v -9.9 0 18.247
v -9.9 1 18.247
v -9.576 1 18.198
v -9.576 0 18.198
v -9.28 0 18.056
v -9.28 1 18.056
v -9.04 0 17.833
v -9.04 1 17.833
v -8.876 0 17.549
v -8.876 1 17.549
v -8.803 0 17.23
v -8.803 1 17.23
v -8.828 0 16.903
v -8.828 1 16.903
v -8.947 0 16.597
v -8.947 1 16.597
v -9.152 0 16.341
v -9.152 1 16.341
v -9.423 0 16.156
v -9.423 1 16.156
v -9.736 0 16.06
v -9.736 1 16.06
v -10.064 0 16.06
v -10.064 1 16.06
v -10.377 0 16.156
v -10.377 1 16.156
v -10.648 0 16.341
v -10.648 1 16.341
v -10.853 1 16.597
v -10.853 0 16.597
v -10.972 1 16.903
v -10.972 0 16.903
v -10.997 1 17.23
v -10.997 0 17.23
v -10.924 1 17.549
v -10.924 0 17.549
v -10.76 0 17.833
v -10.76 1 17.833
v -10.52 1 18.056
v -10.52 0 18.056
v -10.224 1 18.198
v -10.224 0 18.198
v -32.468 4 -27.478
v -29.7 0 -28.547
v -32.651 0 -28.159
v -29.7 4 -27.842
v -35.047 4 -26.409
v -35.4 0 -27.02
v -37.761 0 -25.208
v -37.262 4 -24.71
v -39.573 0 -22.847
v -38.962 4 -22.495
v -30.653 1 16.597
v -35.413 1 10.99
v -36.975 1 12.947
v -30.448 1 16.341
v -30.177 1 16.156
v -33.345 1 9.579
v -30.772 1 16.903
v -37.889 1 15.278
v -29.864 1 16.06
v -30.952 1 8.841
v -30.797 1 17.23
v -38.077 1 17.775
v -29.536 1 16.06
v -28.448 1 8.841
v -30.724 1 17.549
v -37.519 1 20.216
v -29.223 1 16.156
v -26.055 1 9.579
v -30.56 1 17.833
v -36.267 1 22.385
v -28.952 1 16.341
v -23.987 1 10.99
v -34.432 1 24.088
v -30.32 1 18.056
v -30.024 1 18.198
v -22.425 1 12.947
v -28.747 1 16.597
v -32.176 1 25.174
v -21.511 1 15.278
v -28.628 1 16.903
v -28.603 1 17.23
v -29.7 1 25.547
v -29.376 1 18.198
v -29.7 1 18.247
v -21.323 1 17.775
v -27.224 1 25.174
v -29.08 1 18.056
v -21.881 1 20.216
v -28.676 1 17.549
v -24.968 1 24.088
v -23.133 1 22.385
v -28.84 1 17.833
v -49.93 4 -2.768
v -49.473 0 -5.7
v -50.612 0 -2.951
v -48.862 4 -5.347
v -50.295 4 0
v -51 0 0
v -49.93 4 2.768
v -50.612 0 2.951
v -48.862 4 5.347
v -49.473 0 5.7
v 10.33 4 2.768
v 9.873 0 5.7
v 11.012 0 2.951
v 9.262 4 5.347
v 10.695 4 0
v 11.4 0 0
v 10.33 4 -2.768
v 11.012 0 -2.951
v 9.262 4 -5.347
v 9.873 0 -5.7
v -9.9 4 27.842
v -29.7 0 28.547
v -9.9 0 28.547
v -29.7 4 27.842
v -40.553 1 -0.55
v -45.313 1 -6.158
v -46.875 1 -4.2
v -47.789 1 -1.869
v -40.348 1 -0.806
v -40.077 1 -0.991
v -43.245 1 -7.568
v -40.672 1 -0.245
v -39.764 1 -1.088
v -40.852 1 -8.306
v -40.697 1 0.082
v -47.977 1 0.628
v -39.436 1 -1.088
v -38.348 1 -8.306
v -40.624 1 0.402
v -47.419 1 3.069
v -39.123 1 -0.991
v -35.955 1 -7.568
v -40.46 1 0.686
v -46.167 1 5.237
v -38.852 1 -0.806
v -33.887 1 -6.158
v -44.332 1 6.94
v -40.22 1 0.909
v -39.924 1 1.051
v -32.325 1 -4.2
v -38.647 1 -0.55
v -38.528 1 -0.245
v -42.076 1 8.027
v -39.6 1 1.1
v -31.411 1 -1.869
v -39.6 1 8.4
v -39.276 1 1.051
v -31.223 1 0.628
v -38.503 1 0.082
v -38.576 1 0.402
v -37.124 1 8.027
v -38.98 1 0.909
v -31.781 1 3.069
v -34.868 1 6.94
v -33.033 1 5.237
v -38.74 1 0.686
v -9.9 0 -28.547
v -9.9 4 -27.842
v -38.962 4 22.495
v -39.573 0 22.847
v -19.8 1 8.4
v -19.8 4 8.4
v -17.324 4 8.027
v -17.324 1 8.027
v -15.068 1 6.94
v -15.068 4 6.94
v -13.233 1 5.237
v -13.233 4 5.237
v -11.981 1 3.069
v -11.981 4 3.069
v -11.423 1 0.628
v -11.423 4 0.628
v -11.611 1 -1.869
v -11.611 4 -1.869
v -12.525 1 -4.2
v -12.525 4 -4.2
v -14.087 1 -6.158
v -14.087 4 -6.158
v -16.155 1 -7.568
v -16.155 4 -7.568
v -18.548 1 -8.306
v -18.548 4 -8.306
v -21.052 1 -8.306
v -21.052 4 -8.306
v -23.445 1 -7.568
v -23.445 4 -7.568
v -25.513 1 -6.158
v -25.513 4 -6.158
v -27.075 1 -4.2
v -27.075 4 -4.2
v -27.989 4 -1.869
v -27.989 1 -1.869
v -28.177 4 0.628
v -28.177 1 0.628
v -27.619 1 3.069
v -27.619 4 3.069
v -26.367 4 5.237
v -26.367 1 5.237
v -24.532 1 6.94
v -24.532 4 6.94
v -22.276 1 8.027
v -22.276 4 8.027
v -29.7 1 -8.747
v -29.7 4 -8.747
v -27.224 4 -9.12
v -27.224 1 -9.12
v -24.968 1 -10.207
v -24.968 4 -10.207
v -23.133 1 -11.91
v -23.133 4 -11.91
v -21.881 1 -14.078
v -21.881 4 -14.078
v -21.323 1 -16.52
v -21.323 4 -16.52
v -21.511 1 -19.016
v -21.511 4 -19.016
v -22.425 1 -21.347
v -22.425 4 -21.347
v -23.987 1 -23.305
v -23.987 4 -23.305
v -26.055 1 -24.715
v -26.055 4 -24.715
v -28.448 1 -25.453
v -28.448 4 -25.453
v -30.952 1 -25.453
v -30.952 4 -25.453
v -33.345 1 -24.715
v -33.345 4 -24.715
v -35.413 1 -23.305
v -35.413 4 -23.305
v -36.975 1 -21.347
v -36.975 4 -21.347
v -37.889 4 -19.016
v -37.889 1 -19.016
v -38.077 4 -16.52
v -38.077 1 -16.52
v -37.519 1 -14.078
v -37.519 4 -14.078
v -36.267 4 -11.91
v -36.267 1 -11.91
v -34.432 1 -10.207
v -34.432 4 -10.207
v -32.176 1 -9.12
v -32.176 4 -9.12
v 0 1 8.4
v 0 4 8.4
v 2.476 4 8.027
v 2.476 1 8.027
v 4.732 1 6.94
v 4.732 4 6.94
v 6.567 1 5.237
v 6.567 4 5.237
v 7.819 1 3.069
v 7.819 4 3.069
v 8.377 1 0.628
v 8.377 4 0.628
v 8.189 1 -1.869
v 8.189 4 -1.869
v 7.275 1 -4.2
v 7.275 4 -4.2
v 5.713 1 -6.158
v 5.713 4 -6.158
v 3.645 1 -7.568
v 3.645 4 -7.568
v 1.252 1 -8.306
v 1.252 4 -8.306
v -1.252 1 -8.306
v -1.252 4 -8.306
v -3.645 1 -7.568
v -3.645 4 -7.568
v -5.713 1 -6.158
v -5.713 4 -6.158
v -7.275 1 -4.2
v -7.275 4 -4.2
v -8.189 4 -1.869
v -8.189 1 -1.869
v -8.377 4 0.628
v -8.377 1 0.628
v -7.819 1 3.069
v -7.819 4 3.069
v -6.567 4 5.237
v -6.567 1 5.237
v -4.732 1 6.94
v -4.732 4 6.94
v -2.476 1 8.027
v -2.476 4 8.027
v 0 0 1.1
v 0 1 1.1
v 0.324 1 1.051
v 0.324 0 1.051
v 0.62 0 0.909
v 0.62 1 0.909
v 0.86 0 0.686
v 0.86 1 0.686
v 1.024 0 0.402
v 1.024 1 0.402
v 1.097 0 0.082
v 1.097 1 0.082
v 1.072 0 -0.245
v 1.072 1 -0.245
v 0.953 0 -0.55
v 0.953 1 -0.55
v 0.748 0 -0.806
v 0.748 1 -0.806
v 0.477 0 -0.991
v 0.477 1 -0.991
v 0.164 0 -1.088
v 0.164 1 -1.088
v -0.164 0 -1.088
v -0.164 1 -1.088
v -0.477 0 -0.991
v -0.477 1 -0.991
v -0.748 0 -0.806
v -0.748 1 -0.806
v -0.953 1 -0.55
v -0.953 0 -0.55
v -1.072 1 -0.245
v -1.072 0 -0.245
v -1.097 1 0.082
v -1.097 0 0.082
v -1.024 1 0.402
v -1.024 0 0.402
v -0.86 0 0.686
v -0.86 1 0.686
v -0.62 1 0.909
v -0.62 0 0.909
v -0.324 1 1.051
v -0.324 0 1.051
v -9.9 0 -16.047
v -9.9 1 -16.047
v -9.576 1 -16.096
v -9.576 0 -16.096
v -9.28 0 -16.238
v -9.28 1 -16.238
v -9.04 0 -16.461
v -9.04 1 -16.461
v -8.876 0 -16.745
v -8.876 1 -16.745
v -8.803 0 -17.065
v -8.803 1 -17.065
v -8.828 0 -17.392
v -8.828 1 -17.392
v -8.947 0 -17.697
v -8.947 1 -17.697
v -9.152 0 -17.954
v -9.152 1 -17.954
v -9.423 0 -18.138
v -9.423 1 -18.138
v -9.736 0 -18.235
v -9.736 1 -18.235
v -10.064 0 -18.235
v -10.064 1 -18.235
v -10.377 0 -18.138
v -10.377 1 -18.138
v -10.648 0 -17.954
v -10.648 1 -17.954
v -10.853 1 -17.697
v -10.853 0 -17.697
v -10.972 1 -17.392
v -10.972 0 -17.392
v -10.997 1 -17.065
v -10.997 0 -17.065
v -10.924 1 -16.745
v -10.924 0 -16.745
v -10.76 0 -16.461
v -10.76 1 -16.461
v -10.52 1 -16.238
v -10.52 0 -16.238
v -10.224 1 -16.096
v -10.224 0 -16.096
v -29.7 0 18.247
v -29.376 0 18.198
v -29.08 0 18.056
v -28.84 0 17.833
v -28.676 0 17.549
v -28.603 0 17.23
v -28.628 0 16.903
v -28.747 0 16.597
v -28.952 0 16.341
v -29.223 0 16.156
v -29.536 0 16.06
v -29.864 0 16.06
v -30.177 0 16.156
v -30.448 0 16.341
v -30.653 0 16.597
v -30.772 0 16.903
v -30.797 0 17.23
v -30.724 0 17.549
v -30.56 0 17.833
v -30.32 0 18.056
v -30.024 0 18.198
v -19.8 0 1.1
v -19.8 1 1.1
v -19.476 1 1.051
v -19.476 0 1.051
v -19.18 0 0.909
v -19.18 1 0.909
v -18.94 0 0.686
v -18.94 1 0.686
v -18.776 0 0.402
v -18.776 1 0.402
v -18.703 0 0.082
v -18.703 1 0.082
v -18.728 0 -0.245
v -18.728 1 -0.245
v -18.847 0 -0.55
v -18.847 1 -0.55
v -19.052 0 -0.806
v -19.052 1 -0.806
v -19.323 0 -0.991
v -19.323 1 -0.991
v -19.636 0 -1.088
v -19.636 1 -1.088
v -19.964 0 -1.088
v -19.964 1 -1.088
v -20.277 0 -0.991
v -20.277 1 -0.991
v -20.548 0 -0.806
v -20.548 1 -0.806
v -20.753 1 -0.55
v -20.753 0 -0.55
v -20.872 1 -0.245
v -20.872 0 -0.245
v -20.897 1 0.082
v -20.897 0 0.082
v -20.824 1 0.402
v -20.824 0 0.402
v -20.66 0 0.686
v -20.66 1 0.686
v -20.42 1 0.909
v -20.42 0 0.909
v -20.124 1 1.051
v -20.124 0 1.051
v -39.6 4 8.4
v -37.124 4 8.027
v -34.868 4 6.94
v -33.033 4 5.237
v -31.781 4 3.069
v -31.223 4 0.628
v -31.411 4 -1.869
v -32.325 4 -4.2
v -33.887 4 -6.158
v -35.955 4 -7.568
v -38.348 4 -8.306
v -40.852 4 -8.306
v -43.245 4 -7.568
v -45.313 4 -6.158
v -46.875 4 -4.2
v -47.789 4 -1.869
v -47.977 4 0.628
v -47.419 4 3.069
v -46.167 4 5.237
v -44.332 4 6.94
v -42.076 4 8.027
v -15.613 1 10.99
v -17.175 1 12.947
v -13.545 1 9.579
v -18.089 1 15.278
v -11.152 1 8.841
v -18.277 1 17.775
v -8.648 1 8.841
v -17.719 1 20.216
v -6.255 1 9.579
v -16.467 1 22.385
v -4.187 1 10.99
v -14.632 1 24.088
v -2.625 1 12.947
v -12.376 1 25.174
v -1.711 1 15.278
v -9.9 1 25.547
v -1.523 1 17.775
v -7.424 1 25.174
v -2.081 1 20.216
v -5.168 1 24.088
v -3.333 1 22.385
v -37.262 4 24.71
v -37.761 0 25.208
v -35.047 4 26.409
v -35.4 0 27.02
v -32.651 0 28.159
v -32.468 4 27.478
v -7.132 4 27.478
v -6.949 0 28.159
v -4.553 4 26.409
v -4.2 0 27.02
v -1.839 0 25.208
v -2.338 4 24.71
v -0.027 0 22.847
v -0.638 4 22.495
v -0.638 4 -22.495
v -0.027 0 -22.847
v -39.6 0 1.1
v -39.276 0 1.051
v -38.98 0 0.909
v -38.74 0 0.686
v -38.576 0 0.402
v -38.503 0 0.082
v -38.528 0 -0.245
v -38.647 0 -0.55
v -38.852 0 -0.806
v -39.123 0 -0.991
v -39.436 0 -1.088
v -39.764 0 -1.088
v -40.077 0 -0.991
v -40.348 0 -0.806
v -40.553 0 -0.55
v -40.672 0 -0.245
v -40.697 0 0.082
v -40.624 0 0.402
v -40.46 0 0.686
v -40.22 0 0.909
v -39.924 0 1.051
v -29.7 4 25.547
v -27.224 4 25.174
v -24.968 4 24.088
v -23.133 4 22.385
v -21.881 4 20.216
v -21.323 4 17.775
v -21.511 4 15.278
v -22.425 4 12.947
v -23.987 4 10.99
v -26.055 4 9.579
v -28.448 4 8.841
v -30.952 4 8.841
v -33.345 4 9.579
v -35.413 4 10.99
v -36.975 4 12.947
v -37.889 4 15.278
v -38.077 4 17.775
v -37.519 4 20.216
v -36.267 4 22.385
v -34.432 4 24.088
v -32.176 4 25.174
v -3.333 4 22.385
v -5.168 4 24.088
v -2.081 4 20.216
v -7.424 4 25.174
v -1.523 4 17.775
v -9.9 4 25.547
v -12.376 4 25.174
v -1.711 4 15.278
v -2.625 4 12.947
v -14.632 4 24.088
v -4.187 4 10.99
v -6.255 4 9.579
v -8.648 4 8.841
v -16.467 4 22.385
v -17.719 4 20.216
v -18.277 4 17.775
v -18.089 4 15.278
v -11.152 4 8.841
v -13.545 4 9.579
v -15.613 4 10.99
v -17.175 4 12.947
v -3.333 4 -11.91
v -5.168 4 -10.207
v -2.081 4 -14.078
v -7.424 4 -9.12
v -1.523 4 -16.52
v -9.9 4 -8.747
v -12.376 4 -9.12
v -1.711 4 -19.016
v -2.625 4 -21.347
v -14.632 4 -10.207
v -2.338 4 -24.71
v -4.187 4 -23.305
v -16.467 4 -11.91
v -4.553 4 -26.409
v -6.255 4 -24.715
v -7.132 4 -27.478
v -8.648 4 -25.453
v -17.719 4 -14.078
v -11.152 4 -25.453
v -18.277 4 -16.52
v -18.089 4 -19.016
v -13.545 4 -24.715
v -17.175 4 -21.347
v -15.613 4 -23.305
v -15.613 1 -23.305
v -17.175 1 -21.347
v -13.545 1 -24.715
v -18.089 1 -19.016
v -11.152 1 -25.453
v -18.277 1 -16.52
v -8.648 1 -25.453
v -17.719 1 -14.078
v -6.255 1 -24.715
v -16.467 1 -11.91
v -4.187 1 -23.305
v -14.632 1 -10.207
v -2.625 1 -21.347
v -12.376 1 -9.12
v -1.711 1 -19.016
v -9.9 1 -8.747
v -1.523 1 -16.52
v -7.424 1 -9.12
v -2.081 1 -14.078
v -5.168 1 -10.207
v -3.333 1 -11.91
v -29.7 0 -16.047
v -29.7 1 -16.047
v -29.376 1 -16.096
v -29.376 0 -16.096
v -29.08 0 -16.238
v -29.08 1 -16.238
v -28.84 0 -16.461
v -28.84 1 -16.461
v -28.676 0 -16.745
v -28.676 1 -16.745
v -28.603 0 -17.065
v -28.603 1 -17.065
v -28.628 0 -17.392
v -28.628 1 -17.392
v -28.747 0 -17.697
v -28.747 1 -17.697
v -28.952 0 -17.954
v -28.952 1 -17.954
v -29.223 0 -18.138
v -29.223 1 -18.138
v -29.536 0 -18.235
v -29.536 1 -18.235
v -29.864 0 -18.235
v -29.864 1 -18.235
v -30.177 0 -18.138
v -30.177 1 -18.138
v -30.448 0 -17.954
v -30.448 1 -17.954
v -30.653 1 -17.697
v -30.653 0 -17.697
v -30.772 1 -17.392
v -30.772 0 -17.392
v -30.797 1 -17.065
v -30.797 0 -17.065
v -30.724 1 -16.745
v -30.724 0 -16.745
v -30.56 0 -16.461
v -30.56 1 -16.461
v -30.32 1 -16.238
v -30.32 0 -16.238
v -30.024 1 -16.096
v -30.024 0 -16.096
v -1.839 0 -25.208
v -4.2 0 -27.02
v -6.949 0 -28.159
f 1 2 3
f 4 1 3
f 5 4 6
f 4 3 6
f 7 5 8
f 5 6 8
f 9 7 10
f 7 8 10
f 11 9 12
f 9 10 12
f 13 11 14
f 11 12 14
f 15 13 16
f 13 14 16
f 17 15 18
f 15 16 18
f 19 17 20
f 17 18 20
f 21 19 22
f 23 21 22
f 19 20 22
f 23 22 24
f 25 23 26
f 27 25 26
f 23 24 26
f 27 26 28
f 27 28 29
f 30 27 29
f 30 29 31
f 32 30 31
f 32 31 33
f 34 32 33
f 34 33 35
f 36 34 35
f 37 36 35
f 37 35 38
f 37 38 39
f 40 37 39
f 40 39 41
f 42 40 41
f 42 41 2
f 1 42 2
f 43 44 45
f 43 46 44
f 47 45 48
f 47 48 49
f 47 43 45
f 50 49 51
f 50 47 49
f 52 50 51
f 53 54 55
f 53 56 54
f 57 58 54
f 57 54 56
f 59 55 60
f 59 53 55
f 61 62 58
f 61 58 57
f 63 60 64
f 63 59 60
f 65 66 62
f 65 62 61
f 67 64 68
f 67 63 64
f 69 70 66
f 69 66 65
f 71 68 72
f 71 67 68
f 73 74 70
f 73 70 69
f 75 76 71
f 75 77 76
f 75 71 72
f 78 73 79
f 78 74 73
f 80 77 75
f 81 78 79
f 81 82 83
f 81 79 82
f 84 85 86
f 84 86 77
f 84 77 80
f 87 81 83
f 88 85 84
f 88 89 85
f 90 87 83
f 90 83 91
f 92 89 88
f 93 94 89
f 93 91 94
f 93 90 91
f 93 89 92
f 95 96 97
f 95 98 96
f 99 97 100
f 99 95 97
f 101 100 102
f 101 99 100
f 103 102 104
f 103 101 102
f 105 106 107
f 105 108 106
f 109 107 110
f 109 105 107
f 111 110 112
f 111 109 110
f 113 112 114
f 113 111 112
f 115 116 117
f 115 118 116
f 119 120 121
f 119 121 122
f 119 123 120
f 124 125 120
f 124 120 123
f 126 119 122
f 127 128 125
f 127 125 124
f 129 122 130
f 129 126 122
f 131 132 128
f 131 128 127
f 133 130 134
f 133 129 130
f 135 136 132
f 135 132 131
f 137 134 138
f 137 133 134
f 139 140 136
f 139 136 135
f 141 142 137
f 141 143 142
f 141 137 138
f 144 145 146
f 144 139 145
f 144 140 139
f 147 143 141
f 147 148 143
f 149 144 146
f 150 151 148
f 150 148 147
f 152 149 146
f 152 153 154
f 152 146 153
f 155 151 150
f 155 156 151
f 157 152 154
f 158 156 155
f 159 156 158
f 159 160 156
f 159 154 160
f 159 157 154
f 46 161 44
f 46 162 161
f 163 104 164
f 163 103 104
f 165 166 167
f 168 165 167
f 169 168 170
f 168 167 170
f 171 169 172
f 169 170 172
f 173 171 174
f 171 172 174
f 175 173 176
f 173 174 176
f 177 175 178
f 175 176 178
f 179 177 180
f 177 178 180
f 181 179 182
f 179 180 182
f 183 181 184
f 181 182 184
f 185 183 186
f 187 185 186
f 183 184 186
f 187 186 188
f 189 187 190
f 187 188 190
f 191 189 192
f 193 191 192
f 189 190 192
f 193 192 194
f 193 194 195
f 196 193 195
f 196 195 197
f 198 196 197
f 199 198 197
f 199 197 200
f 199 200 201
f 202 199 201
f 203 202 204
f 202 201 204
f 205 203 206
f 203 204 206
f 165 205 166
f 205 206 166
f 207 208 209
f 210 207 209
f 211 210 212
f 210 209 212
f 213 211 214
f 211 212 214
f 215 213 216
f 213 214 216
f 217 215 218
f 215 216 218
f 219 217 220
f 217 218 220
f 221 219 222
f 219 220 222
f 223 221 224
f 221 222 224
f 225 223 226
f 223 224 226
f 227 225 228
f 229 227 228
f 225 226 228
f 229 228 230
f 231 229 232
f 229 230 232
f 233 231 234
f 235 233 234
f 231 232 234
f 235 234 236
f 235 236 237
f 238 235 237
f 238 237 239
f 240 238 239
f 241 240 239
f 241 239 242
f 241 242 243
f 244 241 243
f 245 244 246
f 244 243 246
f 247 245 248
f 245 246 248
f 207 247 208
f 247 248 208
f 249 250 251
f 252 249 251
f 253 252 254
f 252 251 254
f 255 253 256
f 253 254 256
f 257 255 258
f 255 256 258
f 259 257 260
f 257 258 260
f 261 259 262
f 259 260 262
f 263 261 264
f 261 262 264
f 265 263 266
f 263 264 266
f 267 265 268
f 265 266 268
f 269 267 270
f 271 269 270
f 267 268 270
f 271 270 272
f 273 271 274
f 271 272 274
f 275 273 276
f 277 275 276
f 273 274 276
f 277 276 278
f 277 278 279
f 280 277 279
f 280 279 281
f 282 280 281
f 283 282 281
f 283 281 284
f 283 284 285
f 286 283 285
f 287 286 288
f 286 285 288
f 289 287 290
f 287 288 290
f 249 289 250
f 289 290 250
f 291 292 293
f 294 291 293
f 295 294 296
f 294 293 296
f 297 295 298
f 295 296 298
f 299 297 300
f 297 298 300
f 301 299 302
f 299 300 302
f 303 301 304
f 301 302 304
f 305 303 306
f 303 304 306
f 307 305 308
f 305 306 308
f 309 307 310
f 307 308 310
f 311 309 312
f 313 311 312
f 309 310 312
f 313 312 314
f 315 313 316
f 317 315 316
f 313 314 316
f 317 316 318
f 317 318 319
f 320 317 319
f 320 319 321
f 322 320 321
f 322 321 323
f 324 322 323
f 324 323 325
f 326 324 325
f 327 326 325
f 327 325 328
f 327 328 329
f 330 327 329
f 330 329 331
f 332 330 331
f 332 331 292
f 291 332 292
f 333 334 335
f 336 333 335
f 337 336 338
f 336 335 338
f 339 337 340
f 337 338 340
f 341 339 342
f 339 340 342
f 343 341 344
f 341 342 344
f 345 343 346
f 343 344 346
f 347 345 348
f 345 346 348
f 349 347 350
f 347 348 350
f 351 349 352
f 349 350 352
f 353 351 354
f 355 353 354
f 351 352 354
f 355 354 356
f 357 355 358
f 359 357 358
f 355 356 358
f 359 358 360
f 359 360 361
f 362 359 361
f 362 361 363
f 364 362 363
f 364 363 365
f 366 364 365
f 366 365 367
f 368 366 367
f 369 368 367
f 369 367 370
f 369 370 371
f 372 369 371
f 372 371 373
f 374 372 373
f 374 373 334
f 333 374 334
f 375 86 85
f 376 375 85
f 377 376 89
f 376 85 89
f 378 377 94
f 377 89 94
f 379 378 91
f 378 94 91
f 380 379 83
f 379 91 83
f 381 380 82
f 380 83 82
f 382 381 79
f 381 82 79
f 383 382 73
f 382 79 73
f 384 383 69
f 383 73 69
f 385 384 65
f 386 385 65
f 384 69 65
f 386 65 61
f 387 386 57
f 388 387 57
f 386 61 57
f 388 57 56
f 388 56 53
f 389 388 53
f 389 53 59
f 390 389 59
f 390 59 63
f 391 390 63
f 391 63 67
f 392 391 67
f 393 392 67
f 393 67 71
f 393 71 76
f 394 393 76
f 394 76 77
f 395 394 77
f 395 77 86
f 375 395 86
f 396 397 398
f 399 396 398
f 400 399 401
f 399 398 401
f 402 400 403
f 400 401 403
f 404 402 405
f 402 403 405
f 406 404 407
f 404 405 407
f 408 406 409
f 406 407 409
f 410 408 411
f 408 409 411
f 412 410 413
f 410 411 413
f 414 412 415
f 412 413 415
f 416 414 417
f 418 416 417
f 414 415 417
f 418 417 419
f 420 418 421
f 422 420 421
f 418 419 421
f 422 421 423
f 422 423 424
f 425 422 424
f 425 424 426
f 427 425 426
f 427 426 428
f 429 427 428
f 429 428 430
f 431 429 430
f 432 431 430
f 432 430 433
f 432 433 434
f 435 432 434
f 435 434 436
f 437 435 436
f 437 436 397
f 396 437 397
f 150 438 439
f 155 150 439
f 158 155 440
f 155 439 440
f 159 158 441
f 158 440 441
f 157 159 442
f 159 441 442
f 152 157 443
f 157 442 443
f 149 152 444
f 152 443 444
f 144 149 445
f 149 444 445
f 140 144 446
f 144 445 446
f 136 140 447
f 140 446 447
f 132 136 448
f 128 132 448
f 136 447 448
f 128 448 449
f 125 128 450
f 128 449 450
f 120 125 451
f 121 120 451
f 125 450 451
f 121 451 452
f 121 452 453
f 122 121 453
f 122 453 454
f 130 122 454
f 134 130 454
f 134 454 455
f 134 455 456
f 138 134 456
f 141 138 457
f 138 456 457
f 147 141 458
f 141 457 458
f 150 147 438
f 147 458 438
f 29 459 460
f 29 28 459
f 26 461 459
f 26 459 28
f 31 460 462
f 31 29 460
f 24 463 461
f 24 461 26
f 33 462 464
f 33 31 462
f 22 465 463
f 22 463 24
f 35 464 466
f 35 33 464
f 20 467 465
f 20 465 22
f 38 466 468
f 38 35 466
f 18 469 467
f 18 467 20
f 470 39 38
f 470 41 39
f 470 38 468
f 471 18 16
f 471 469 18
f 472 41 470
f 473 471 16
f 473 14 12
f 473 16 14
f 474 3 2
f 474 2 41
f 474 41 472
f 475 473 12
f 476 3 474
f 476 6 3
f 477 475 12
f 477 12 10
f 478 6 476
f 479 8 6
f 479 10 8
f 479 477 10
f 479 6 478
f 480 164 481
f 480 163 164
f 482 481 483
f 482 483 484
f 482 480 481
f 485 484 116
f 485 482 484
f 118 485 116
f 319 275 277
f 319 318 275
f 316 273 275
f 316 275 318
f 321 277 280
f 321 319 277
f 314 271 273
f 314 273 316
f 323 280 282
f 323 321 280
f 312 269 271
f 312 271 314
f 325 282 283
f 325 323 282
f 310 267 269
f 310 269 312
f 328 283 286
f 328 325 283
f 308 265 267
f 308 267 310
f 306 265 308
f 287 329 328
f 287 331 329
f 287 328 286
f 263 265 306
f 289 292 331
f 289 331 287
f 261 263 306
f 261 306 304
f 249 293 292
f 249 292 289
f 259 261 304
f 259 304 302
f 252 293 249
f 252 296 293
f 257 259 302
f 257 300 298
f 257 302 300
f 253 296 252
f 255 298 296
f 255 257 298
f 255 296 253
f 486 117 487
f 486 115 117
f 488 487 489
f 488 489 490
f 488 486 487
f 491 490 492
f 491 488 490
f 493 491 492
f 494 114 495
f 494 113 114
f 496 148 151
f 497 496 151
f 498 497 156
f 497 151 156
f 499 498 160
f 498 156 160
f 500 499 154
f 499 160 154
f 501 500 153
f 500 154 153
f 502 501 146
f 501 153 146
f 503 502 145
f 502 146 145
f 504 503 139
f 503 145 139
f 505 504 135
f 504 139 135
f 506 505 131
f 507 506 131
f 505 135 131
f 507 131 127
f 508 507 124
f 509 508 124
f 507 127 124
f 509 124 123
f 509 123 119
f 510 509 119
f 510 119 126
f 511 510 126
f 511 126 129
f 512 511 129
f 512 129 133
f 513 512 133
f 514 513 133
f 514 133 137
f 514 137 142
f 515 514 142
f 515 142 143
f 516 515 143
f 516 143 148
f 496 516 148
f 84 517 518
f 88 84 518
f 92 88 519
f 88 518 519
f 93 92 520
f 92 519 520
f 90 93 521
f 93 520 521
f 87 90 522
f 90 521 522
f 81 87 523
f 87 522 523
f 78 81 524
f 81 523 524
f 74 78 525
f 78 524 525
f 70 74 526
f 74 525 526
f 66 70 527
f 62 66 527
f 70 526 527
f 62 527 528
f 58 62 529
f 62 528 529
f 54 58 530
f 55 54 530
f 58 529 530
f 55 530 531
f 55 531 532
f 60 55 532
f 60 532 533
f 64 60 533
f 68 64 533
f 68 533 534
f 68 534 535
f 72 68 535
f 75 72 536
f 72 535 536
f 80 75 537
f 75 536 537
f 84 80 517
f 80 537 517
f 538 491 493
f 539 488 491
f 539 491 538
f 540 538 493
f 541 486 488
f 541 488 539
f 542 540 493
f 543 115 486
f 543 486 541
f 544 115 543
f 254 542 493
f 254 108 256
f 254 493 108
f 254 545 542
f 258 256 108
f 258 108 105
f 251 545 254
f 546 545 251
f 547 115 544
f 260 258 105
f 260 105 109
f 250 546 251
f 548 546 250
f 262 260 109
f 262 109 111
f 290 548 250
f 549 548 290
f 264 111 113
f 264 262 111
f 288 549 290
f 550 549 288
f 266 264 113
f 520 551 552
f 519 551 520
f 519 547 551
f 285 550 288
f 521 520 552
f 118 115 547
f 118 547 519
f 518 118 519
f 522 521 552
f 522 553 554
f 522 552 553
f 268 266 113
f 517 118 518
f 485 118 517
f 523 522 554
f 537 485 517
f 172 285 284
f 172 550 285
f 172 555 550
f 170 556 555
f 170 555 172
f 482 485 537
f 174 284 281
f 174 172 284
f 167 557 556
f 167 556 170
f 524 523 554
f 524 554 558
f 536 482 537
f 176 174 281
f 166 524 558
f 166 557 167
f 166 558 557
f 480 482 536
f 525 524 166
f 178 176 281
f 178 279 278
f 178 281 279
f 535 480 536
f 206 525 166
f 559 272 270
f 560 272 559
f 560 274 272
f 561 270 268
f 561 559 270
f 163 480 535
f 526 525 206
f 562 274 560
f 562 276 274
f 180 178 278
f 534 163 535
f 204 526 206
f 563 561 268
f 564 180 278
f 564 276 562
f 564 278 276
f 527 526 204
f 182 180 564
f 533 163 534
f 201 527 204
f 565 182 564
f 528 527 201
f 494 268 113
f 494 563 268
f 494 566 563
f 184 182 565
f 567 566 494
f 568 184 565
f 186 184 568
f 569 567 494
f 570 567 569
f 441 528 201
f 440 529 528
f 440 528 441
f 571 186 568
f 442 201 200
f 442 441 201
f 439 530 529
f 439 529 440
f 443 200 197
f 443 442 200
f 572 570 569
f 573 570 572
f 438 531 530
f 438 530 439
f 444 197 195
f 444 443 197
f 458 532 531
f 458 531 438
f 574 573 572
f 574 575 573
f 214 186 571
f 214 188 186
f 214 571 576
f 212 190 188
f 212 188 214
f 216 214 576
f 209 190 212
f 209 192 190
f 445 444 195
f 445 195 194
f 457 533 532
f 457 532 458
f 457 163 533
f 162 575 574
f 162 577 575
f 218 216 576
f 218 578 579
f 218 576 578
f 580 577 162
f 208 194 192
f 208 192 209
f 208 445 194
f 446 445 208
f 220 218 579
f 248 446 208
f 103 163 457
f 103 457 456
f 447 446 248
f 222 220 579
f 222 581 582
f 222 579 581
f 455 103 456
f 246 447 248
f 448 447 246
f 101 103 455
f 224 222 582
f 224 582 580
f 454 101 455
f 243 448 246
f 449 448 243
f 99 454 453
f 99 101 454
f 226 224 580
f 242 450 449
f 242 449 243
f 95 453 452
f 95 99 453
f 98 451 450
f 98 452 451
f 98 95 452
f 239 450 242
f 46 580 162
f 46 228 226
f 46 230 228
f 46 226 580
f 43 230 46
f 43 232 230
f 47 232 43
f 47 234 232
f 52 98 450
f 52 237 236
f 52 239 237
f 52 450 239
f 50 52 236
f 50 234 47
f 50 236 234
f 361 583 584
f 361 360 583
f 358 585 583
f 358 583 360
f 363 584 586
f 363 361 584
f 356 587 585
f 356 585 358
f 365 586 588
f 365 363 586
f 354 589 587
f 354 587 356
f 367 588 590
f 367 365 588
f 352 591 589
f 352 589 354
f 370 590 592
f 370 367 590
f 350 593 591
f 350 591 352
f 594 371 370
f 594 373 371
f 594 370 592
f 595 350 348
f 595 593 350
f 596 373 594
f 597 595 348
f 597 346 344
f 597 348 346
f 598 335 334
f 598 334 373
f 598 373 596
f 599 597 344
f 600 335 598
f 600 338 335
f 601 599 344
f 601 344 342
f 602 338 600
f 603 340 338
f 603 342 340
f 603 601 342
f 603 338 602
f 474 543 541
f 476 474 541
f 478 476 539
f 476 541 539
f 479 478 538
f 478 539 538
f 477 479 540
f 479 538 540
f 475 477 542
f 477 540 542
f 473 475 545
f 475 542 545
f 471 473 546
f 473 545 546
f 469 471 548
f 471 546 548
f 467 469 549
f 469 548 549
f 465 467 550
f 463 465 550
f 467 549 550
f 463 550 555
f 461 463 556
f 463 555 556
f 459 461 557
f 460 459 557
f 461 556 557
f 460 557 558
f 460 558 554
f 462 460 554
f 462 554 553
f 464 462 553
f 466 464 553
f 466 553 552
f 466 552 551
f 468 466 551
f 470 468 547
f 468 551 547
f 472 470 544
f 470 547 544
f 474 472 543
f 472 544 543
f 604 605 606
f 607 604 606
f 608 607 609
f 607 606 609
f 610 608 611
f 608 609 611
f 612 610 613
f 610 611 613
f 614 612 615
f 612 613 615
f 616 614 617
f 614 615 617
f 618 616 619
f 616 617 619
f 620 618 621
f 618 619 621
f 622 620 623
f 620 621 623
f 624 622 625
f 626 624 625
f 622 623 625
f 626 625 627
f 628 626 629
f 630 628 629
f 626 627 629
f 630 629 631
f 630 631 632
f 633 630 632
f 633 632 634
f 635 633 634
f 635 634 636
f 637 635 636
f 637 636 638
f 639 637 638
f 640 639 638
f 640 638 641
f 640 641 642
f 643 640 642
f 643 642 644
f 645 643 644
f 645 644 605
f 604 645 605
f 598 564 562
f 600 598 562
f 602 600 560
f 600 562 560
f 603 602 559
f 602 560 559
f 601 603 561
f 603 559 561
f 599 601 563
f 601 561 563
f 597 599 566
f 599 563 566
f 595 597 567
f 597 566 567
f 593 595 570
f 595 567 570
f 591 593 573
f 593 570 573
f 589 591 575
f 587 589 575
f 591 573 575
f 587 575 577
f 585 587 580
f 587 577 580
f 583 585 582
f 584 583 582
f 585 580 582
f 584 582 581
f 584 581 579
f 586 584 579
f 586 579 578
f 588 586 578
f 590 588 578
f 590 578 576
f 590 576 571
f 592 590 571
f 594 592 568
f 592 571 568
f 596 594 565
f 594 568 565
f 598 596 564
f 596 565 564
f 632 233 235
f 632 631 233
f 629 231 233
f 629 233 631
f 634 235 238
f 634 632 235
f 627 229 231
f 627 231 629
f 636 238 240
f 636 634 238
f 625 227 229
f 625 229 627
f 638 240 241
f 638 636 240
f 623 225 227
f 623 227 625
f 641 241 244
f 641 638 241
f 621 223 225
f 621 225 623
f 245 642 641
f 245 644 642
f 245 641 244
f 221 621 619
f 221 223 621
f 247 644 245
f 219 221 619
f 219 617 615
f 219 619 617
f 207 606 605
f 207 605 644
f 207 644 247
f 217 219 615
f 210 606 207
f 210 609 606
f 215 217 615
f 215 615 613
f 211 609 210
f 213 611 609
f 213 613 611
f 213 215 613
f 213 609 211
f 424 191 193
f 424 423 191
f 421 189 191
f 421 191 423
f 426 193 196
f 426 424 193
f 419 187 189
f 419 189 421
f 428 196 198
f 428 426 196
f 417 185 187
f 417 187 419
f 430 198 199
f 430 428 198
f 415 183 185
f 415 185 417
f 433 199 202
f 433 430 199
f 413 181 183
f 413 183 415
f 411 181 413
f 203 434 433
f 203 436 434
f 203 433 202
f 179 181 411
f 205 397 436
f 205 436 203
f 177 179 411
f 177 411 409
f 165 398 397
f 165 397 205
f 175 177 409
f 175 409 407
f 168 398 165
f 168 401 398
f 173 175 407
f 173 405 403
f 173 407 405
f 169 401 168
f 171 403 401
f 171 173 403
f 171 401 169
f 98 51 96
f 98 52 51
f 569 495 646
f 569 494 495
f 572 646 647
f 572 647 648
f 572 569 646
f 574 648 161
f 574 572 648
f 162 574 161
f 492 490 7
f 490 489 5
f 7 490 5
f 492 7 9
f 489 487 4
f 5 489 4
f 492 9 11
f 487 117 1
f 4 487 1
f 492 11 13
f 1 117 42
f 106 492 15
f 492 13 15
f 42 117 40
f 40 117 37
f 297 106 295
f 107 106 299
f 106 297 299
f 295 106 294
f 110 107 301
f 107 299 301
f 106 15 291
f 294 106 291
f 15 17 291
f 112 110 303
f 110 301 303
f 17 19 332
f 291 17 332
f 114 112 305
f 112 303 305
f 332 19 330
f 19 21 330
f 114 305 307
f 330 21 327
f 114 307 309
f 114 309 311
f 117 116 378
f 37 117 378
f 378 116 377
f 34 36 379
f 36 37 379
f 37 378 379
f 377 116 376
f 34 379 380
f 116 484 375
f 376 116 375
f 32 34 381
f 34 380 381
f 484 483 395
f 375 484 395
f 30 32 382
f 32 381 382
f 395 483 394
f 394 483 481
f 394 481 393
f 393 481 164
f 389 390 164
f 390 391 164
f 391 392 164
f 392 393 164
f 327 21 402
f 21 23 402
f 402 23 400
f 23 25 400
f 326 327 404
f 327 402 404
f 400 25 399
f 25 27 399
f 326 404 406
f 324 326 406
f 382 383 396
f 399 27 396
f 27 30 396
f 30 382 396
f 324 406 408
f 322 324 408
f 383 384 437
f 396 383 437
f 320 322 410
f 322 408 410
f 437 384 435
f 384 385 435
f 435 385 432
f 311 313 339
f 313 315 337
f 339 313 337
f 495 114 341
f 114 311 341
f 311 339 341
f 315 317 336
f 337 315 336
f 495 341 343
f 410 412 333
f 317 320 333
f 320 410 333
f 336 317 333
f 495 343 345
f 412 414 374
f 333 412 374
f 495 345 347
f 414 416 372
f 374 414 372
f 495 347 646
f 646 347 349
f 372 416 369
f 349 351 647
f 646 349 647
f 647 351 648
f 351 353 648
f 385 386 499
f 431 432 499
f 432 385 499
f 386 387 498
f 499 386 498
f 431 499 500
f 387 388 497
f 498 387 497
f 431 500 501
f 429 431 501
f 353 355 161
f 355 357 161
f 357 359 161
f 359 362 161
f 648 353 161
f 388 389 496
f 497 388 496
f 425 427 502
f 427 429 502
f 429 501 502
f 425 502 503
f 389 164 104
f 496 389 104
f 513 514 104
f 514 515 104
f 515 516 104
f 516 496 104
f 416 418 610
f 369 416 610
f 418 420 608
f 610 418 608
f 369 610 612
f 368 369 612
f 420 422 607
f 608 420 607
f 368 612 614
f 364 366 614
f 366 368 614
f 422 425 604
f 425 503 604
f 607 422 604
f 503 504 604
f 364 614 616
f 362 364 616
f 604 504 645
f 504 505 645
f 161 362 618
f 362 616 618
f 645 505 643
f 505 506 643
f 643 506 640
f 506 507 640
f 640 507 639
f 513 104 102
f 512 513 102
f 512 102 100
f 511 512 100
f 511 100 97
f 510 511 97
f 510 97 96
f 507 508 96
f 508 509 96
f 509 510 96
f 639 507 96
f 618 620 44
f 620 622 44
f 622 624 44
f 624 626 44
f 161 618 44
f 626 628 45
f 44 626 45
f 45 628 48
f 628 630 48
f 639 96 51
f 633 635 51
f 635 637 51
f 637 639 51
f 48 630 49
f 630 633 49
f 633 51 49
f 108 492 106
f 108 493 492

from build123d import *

# Parameters (mm, degrees)
BOSS_EXTRUDE1_DEPTH = 4
BOSS_EXTRUDE1_TAPER = 10
CUT_EXTRUDE1_START  = 4
SKETCH1_3_R         = 1.1
CUT_EXTRUDE1_DEPTH  = 4
CUT_EXTRUDE2_START  = 4
SKETCH1_4_R         = 8.4
SKETCH1_4_R_2       = 1.1
CUT_EXTRUDE2_DEPTH  = 3


with BuildPart() as part:
    # Sketch1 → Boss-Extrude1 (new body)
    with BuildSketch(Plane(origin=(0, 0, 0), x_dir=(1, 0, 0), z_dir=(0, 1, 0))):
        with BuildLine():
            ThreePointArc((-29.7, 28.547302995), (-35.4, 27.019992598), (-39.572689603, 22.847302995))
            Line((-39.572689603, 22.847302995), (-49.472689603, 5.7))
            ThreePointArc((-49.472689603, 5.7), (-51, 0), (-49.472689603, -5.7))
            Line((-49.472689603, -5.7), (-39.572689603, -22.847302995))
            ThreePointArc((-39.572689603, -22.847302995), (-35.4, -27.019992598), (-29.7, -28.547302995))
            Line((-29.7, -28.547302995), (-9.9, -28.547302995))
            ThreePointArc((-9.9, -28.547302995), (-4.2, -27.019992598), (-0.027310397, -22.847302995))
            Line((-0.027310397, -22.847302995), (9.872689603, -5.7))
            ThreePointArc((9.872689603, -5.7), (11.4, 0), (9.872689603, 5.7))
            Line((9.872689603, 5.7), (-0.027310397, 22.847302995))
            ThreePointArc((-0.027310397, 22.847302995), (-4.2, 27.019992598), (-9.9, 28.547302995))
            Line((-9.9, 28.547302995), (-29.7, 28.547302995))
        make_face()
    extrude(amount=BOSS_EXTRUDE1_DEPTH, taper=BOSS_EXTRUDE1_TAPER)

    # Sketch1<3> → Cut-Extrude1 (cut)
    with BuildSketch(Plane(origin=(0, 0, 0), x_dir=(1, 0, 0), z_dir=(0, 1, 0)).offset(CUT_EXTRUDE1_START)):
        with Locations(Location((-9.9, -17.147302995, 0), (0, 0, 270))):
            Circle(SKETCH1_3_R)
        with Locations(Location((0, 0, 0), (0, 0, 270))):
            Circle(SKETCH1_3_R)
        with Locations(Location((-29.7, -17.147302995, 0), (0, 0, 270))):
            Circle(SKETCH1_3_R)
        with Locations(Location((-39.6, 0, 0), (0, 0, 270))):
            Circle(SKETCH1_3_R)
        with Locations(Location((-9.9, 17.147302995, 0), (0, 0, 270))):
            Circle(SKETCH1_3_R)
        with Locations(Location((-29.7, 17.147302995, 0), (0, 0, 270))):
            Circle(SKETCH1_3_R)
        with Locations(Location((-19.8, 0, 0), (0, 0, 270))):
            Circle(SKETCH1_3_R)
    extrude(amount=-CUT_EXTRUDE1_DEPTH, mode=Mode.SUBTRACT)

    # Sketch1<4> → Cut-Extrude2 (cut)
    # profile 1 of 7: a face of its own
    with BuildSketch(Plane(origin=(0, 0, 0), x_dir=(1, 0, 0), z_dir=(0, 1, 0)).offset(CUT_EXTRUDE2_START)):
        with Locations(Location((-19.8, 0, 0), (0, 0, 270))):
            Circle(SKETCH1_4_R)
        with Locations(Location((-19.8, 0, 0), (0, 0, 270))):
            Circle(SKETCH1_4_R_2, mode=Mode.SUBTRACT)
    # profile 2 of 7: a face of its own
    with BuildSketch(Plane(origin=(0, 0, 0), x_dir=(1, 0, 0), z_dir=(0, 1, 0)).offset(CUT_EXTRUDE2_START)):
        with Locations(Location((-9.9, -17.147302995, 0), (0, 0, 270))):
            Circle(SKETCH1_4_R)
        with Locations(Location((-9.9, -17.147302995, 0), (0, 0, 270))):
            Circle(SKETCH1_4_R_2, mode=Mode.SUBTRACT)
    # profile 3 of 7: a face of its own
    with BuildSketch(Plane(origin=(0, 0, 0), x_dir=(1, 0, 0), z_dir=(0, 1, 0)).offset(CUT_EXTRUDE2_START)):
        with Locations(Location((0, 0, 0), (0, 0, 270))):
            Circle(SKETCH1_4_R)
        with Locations(Location((0, 0, 0), (0, 0, 270))):
            Circle(SKETCH1_4_R_2, mode=Mode.SUBTRACT)
    # profile 4 of 7: a face of its own
    with BuildSketch(Plane(origin=(0, 0, 0), x_dir=(1, 0, 0), z_dir=(0, 1, 0)).offset(CUT_EXTRUDE2_START)):
        with Locations(Location((-29.7, -17.147302995, 0), (0, 0, 270))):
            Circle(SKETCH1_4_R)
        with Locations(Location((-29.7, -17.147302995, 0), (0, 0, 270))):
            Circle(SKETCH1_4_R_2, mode=Mode.SUBTRACT)
    # profile 5 of 7: a face of its own
    with BuildSketch(Plane(origin=(0, 0, 0), x_dir=(1, 0, 0), z_dir=(0, 1, 0)).offset(CUT_EXTRUDE2_START)):
        with Locations(Location((-39.6, 0, 0), (0, 0, 270))):
            Circle(SKETCH1_4_R)
        with Locations(Location((-39.6, 0, 0), (0, 0, 270))):
            Circle(SKETCH1_4_R_2, mode=Mode.SUBTRACT)
    # profile 6 of 7: a face of its own
    with BuildSketch(Plane(origin=(0, 0, 0), x_dir=(1, 0, 0), z_dir=(0, 1, 0)).offset(CUT_EXTRUDE2_START)):
        with Locations(Location((-9.9, 17.147302995, 0), (0, 0, 270))):
            Circle(SKETCH1_4_R)
        with Locations(Location((-9.9, 17.147302995, 0), (0, 0, 270))):
            Circle(SKETCH1_4_R_2, mode=Mode.SUBTRACT)
    # profile 7 of 7: a face of its own
    with BuildSketch(Plane(origin=(0, 0, 0), x_dir=(1, 0, 0), z_dir=(0, 1, 0)).offset(CUT_EXTRUDE2_START)):
        with Locations(Location((-29.7, 17.147302995, 0), (0, 0, 270))):
            Circle(SKETCH1_4_R)
        with Locations(Location((-29.7, 17.147302995, 0), (0, 0, 270))):
            Circle(SKETCH1_4_R_2, mode=Mode.SUBTRACT)
    extrude(amount=-CUT_EXTRUDE2_DEPTH, mode=Mode.SUBTRACT)


solid = part.part
